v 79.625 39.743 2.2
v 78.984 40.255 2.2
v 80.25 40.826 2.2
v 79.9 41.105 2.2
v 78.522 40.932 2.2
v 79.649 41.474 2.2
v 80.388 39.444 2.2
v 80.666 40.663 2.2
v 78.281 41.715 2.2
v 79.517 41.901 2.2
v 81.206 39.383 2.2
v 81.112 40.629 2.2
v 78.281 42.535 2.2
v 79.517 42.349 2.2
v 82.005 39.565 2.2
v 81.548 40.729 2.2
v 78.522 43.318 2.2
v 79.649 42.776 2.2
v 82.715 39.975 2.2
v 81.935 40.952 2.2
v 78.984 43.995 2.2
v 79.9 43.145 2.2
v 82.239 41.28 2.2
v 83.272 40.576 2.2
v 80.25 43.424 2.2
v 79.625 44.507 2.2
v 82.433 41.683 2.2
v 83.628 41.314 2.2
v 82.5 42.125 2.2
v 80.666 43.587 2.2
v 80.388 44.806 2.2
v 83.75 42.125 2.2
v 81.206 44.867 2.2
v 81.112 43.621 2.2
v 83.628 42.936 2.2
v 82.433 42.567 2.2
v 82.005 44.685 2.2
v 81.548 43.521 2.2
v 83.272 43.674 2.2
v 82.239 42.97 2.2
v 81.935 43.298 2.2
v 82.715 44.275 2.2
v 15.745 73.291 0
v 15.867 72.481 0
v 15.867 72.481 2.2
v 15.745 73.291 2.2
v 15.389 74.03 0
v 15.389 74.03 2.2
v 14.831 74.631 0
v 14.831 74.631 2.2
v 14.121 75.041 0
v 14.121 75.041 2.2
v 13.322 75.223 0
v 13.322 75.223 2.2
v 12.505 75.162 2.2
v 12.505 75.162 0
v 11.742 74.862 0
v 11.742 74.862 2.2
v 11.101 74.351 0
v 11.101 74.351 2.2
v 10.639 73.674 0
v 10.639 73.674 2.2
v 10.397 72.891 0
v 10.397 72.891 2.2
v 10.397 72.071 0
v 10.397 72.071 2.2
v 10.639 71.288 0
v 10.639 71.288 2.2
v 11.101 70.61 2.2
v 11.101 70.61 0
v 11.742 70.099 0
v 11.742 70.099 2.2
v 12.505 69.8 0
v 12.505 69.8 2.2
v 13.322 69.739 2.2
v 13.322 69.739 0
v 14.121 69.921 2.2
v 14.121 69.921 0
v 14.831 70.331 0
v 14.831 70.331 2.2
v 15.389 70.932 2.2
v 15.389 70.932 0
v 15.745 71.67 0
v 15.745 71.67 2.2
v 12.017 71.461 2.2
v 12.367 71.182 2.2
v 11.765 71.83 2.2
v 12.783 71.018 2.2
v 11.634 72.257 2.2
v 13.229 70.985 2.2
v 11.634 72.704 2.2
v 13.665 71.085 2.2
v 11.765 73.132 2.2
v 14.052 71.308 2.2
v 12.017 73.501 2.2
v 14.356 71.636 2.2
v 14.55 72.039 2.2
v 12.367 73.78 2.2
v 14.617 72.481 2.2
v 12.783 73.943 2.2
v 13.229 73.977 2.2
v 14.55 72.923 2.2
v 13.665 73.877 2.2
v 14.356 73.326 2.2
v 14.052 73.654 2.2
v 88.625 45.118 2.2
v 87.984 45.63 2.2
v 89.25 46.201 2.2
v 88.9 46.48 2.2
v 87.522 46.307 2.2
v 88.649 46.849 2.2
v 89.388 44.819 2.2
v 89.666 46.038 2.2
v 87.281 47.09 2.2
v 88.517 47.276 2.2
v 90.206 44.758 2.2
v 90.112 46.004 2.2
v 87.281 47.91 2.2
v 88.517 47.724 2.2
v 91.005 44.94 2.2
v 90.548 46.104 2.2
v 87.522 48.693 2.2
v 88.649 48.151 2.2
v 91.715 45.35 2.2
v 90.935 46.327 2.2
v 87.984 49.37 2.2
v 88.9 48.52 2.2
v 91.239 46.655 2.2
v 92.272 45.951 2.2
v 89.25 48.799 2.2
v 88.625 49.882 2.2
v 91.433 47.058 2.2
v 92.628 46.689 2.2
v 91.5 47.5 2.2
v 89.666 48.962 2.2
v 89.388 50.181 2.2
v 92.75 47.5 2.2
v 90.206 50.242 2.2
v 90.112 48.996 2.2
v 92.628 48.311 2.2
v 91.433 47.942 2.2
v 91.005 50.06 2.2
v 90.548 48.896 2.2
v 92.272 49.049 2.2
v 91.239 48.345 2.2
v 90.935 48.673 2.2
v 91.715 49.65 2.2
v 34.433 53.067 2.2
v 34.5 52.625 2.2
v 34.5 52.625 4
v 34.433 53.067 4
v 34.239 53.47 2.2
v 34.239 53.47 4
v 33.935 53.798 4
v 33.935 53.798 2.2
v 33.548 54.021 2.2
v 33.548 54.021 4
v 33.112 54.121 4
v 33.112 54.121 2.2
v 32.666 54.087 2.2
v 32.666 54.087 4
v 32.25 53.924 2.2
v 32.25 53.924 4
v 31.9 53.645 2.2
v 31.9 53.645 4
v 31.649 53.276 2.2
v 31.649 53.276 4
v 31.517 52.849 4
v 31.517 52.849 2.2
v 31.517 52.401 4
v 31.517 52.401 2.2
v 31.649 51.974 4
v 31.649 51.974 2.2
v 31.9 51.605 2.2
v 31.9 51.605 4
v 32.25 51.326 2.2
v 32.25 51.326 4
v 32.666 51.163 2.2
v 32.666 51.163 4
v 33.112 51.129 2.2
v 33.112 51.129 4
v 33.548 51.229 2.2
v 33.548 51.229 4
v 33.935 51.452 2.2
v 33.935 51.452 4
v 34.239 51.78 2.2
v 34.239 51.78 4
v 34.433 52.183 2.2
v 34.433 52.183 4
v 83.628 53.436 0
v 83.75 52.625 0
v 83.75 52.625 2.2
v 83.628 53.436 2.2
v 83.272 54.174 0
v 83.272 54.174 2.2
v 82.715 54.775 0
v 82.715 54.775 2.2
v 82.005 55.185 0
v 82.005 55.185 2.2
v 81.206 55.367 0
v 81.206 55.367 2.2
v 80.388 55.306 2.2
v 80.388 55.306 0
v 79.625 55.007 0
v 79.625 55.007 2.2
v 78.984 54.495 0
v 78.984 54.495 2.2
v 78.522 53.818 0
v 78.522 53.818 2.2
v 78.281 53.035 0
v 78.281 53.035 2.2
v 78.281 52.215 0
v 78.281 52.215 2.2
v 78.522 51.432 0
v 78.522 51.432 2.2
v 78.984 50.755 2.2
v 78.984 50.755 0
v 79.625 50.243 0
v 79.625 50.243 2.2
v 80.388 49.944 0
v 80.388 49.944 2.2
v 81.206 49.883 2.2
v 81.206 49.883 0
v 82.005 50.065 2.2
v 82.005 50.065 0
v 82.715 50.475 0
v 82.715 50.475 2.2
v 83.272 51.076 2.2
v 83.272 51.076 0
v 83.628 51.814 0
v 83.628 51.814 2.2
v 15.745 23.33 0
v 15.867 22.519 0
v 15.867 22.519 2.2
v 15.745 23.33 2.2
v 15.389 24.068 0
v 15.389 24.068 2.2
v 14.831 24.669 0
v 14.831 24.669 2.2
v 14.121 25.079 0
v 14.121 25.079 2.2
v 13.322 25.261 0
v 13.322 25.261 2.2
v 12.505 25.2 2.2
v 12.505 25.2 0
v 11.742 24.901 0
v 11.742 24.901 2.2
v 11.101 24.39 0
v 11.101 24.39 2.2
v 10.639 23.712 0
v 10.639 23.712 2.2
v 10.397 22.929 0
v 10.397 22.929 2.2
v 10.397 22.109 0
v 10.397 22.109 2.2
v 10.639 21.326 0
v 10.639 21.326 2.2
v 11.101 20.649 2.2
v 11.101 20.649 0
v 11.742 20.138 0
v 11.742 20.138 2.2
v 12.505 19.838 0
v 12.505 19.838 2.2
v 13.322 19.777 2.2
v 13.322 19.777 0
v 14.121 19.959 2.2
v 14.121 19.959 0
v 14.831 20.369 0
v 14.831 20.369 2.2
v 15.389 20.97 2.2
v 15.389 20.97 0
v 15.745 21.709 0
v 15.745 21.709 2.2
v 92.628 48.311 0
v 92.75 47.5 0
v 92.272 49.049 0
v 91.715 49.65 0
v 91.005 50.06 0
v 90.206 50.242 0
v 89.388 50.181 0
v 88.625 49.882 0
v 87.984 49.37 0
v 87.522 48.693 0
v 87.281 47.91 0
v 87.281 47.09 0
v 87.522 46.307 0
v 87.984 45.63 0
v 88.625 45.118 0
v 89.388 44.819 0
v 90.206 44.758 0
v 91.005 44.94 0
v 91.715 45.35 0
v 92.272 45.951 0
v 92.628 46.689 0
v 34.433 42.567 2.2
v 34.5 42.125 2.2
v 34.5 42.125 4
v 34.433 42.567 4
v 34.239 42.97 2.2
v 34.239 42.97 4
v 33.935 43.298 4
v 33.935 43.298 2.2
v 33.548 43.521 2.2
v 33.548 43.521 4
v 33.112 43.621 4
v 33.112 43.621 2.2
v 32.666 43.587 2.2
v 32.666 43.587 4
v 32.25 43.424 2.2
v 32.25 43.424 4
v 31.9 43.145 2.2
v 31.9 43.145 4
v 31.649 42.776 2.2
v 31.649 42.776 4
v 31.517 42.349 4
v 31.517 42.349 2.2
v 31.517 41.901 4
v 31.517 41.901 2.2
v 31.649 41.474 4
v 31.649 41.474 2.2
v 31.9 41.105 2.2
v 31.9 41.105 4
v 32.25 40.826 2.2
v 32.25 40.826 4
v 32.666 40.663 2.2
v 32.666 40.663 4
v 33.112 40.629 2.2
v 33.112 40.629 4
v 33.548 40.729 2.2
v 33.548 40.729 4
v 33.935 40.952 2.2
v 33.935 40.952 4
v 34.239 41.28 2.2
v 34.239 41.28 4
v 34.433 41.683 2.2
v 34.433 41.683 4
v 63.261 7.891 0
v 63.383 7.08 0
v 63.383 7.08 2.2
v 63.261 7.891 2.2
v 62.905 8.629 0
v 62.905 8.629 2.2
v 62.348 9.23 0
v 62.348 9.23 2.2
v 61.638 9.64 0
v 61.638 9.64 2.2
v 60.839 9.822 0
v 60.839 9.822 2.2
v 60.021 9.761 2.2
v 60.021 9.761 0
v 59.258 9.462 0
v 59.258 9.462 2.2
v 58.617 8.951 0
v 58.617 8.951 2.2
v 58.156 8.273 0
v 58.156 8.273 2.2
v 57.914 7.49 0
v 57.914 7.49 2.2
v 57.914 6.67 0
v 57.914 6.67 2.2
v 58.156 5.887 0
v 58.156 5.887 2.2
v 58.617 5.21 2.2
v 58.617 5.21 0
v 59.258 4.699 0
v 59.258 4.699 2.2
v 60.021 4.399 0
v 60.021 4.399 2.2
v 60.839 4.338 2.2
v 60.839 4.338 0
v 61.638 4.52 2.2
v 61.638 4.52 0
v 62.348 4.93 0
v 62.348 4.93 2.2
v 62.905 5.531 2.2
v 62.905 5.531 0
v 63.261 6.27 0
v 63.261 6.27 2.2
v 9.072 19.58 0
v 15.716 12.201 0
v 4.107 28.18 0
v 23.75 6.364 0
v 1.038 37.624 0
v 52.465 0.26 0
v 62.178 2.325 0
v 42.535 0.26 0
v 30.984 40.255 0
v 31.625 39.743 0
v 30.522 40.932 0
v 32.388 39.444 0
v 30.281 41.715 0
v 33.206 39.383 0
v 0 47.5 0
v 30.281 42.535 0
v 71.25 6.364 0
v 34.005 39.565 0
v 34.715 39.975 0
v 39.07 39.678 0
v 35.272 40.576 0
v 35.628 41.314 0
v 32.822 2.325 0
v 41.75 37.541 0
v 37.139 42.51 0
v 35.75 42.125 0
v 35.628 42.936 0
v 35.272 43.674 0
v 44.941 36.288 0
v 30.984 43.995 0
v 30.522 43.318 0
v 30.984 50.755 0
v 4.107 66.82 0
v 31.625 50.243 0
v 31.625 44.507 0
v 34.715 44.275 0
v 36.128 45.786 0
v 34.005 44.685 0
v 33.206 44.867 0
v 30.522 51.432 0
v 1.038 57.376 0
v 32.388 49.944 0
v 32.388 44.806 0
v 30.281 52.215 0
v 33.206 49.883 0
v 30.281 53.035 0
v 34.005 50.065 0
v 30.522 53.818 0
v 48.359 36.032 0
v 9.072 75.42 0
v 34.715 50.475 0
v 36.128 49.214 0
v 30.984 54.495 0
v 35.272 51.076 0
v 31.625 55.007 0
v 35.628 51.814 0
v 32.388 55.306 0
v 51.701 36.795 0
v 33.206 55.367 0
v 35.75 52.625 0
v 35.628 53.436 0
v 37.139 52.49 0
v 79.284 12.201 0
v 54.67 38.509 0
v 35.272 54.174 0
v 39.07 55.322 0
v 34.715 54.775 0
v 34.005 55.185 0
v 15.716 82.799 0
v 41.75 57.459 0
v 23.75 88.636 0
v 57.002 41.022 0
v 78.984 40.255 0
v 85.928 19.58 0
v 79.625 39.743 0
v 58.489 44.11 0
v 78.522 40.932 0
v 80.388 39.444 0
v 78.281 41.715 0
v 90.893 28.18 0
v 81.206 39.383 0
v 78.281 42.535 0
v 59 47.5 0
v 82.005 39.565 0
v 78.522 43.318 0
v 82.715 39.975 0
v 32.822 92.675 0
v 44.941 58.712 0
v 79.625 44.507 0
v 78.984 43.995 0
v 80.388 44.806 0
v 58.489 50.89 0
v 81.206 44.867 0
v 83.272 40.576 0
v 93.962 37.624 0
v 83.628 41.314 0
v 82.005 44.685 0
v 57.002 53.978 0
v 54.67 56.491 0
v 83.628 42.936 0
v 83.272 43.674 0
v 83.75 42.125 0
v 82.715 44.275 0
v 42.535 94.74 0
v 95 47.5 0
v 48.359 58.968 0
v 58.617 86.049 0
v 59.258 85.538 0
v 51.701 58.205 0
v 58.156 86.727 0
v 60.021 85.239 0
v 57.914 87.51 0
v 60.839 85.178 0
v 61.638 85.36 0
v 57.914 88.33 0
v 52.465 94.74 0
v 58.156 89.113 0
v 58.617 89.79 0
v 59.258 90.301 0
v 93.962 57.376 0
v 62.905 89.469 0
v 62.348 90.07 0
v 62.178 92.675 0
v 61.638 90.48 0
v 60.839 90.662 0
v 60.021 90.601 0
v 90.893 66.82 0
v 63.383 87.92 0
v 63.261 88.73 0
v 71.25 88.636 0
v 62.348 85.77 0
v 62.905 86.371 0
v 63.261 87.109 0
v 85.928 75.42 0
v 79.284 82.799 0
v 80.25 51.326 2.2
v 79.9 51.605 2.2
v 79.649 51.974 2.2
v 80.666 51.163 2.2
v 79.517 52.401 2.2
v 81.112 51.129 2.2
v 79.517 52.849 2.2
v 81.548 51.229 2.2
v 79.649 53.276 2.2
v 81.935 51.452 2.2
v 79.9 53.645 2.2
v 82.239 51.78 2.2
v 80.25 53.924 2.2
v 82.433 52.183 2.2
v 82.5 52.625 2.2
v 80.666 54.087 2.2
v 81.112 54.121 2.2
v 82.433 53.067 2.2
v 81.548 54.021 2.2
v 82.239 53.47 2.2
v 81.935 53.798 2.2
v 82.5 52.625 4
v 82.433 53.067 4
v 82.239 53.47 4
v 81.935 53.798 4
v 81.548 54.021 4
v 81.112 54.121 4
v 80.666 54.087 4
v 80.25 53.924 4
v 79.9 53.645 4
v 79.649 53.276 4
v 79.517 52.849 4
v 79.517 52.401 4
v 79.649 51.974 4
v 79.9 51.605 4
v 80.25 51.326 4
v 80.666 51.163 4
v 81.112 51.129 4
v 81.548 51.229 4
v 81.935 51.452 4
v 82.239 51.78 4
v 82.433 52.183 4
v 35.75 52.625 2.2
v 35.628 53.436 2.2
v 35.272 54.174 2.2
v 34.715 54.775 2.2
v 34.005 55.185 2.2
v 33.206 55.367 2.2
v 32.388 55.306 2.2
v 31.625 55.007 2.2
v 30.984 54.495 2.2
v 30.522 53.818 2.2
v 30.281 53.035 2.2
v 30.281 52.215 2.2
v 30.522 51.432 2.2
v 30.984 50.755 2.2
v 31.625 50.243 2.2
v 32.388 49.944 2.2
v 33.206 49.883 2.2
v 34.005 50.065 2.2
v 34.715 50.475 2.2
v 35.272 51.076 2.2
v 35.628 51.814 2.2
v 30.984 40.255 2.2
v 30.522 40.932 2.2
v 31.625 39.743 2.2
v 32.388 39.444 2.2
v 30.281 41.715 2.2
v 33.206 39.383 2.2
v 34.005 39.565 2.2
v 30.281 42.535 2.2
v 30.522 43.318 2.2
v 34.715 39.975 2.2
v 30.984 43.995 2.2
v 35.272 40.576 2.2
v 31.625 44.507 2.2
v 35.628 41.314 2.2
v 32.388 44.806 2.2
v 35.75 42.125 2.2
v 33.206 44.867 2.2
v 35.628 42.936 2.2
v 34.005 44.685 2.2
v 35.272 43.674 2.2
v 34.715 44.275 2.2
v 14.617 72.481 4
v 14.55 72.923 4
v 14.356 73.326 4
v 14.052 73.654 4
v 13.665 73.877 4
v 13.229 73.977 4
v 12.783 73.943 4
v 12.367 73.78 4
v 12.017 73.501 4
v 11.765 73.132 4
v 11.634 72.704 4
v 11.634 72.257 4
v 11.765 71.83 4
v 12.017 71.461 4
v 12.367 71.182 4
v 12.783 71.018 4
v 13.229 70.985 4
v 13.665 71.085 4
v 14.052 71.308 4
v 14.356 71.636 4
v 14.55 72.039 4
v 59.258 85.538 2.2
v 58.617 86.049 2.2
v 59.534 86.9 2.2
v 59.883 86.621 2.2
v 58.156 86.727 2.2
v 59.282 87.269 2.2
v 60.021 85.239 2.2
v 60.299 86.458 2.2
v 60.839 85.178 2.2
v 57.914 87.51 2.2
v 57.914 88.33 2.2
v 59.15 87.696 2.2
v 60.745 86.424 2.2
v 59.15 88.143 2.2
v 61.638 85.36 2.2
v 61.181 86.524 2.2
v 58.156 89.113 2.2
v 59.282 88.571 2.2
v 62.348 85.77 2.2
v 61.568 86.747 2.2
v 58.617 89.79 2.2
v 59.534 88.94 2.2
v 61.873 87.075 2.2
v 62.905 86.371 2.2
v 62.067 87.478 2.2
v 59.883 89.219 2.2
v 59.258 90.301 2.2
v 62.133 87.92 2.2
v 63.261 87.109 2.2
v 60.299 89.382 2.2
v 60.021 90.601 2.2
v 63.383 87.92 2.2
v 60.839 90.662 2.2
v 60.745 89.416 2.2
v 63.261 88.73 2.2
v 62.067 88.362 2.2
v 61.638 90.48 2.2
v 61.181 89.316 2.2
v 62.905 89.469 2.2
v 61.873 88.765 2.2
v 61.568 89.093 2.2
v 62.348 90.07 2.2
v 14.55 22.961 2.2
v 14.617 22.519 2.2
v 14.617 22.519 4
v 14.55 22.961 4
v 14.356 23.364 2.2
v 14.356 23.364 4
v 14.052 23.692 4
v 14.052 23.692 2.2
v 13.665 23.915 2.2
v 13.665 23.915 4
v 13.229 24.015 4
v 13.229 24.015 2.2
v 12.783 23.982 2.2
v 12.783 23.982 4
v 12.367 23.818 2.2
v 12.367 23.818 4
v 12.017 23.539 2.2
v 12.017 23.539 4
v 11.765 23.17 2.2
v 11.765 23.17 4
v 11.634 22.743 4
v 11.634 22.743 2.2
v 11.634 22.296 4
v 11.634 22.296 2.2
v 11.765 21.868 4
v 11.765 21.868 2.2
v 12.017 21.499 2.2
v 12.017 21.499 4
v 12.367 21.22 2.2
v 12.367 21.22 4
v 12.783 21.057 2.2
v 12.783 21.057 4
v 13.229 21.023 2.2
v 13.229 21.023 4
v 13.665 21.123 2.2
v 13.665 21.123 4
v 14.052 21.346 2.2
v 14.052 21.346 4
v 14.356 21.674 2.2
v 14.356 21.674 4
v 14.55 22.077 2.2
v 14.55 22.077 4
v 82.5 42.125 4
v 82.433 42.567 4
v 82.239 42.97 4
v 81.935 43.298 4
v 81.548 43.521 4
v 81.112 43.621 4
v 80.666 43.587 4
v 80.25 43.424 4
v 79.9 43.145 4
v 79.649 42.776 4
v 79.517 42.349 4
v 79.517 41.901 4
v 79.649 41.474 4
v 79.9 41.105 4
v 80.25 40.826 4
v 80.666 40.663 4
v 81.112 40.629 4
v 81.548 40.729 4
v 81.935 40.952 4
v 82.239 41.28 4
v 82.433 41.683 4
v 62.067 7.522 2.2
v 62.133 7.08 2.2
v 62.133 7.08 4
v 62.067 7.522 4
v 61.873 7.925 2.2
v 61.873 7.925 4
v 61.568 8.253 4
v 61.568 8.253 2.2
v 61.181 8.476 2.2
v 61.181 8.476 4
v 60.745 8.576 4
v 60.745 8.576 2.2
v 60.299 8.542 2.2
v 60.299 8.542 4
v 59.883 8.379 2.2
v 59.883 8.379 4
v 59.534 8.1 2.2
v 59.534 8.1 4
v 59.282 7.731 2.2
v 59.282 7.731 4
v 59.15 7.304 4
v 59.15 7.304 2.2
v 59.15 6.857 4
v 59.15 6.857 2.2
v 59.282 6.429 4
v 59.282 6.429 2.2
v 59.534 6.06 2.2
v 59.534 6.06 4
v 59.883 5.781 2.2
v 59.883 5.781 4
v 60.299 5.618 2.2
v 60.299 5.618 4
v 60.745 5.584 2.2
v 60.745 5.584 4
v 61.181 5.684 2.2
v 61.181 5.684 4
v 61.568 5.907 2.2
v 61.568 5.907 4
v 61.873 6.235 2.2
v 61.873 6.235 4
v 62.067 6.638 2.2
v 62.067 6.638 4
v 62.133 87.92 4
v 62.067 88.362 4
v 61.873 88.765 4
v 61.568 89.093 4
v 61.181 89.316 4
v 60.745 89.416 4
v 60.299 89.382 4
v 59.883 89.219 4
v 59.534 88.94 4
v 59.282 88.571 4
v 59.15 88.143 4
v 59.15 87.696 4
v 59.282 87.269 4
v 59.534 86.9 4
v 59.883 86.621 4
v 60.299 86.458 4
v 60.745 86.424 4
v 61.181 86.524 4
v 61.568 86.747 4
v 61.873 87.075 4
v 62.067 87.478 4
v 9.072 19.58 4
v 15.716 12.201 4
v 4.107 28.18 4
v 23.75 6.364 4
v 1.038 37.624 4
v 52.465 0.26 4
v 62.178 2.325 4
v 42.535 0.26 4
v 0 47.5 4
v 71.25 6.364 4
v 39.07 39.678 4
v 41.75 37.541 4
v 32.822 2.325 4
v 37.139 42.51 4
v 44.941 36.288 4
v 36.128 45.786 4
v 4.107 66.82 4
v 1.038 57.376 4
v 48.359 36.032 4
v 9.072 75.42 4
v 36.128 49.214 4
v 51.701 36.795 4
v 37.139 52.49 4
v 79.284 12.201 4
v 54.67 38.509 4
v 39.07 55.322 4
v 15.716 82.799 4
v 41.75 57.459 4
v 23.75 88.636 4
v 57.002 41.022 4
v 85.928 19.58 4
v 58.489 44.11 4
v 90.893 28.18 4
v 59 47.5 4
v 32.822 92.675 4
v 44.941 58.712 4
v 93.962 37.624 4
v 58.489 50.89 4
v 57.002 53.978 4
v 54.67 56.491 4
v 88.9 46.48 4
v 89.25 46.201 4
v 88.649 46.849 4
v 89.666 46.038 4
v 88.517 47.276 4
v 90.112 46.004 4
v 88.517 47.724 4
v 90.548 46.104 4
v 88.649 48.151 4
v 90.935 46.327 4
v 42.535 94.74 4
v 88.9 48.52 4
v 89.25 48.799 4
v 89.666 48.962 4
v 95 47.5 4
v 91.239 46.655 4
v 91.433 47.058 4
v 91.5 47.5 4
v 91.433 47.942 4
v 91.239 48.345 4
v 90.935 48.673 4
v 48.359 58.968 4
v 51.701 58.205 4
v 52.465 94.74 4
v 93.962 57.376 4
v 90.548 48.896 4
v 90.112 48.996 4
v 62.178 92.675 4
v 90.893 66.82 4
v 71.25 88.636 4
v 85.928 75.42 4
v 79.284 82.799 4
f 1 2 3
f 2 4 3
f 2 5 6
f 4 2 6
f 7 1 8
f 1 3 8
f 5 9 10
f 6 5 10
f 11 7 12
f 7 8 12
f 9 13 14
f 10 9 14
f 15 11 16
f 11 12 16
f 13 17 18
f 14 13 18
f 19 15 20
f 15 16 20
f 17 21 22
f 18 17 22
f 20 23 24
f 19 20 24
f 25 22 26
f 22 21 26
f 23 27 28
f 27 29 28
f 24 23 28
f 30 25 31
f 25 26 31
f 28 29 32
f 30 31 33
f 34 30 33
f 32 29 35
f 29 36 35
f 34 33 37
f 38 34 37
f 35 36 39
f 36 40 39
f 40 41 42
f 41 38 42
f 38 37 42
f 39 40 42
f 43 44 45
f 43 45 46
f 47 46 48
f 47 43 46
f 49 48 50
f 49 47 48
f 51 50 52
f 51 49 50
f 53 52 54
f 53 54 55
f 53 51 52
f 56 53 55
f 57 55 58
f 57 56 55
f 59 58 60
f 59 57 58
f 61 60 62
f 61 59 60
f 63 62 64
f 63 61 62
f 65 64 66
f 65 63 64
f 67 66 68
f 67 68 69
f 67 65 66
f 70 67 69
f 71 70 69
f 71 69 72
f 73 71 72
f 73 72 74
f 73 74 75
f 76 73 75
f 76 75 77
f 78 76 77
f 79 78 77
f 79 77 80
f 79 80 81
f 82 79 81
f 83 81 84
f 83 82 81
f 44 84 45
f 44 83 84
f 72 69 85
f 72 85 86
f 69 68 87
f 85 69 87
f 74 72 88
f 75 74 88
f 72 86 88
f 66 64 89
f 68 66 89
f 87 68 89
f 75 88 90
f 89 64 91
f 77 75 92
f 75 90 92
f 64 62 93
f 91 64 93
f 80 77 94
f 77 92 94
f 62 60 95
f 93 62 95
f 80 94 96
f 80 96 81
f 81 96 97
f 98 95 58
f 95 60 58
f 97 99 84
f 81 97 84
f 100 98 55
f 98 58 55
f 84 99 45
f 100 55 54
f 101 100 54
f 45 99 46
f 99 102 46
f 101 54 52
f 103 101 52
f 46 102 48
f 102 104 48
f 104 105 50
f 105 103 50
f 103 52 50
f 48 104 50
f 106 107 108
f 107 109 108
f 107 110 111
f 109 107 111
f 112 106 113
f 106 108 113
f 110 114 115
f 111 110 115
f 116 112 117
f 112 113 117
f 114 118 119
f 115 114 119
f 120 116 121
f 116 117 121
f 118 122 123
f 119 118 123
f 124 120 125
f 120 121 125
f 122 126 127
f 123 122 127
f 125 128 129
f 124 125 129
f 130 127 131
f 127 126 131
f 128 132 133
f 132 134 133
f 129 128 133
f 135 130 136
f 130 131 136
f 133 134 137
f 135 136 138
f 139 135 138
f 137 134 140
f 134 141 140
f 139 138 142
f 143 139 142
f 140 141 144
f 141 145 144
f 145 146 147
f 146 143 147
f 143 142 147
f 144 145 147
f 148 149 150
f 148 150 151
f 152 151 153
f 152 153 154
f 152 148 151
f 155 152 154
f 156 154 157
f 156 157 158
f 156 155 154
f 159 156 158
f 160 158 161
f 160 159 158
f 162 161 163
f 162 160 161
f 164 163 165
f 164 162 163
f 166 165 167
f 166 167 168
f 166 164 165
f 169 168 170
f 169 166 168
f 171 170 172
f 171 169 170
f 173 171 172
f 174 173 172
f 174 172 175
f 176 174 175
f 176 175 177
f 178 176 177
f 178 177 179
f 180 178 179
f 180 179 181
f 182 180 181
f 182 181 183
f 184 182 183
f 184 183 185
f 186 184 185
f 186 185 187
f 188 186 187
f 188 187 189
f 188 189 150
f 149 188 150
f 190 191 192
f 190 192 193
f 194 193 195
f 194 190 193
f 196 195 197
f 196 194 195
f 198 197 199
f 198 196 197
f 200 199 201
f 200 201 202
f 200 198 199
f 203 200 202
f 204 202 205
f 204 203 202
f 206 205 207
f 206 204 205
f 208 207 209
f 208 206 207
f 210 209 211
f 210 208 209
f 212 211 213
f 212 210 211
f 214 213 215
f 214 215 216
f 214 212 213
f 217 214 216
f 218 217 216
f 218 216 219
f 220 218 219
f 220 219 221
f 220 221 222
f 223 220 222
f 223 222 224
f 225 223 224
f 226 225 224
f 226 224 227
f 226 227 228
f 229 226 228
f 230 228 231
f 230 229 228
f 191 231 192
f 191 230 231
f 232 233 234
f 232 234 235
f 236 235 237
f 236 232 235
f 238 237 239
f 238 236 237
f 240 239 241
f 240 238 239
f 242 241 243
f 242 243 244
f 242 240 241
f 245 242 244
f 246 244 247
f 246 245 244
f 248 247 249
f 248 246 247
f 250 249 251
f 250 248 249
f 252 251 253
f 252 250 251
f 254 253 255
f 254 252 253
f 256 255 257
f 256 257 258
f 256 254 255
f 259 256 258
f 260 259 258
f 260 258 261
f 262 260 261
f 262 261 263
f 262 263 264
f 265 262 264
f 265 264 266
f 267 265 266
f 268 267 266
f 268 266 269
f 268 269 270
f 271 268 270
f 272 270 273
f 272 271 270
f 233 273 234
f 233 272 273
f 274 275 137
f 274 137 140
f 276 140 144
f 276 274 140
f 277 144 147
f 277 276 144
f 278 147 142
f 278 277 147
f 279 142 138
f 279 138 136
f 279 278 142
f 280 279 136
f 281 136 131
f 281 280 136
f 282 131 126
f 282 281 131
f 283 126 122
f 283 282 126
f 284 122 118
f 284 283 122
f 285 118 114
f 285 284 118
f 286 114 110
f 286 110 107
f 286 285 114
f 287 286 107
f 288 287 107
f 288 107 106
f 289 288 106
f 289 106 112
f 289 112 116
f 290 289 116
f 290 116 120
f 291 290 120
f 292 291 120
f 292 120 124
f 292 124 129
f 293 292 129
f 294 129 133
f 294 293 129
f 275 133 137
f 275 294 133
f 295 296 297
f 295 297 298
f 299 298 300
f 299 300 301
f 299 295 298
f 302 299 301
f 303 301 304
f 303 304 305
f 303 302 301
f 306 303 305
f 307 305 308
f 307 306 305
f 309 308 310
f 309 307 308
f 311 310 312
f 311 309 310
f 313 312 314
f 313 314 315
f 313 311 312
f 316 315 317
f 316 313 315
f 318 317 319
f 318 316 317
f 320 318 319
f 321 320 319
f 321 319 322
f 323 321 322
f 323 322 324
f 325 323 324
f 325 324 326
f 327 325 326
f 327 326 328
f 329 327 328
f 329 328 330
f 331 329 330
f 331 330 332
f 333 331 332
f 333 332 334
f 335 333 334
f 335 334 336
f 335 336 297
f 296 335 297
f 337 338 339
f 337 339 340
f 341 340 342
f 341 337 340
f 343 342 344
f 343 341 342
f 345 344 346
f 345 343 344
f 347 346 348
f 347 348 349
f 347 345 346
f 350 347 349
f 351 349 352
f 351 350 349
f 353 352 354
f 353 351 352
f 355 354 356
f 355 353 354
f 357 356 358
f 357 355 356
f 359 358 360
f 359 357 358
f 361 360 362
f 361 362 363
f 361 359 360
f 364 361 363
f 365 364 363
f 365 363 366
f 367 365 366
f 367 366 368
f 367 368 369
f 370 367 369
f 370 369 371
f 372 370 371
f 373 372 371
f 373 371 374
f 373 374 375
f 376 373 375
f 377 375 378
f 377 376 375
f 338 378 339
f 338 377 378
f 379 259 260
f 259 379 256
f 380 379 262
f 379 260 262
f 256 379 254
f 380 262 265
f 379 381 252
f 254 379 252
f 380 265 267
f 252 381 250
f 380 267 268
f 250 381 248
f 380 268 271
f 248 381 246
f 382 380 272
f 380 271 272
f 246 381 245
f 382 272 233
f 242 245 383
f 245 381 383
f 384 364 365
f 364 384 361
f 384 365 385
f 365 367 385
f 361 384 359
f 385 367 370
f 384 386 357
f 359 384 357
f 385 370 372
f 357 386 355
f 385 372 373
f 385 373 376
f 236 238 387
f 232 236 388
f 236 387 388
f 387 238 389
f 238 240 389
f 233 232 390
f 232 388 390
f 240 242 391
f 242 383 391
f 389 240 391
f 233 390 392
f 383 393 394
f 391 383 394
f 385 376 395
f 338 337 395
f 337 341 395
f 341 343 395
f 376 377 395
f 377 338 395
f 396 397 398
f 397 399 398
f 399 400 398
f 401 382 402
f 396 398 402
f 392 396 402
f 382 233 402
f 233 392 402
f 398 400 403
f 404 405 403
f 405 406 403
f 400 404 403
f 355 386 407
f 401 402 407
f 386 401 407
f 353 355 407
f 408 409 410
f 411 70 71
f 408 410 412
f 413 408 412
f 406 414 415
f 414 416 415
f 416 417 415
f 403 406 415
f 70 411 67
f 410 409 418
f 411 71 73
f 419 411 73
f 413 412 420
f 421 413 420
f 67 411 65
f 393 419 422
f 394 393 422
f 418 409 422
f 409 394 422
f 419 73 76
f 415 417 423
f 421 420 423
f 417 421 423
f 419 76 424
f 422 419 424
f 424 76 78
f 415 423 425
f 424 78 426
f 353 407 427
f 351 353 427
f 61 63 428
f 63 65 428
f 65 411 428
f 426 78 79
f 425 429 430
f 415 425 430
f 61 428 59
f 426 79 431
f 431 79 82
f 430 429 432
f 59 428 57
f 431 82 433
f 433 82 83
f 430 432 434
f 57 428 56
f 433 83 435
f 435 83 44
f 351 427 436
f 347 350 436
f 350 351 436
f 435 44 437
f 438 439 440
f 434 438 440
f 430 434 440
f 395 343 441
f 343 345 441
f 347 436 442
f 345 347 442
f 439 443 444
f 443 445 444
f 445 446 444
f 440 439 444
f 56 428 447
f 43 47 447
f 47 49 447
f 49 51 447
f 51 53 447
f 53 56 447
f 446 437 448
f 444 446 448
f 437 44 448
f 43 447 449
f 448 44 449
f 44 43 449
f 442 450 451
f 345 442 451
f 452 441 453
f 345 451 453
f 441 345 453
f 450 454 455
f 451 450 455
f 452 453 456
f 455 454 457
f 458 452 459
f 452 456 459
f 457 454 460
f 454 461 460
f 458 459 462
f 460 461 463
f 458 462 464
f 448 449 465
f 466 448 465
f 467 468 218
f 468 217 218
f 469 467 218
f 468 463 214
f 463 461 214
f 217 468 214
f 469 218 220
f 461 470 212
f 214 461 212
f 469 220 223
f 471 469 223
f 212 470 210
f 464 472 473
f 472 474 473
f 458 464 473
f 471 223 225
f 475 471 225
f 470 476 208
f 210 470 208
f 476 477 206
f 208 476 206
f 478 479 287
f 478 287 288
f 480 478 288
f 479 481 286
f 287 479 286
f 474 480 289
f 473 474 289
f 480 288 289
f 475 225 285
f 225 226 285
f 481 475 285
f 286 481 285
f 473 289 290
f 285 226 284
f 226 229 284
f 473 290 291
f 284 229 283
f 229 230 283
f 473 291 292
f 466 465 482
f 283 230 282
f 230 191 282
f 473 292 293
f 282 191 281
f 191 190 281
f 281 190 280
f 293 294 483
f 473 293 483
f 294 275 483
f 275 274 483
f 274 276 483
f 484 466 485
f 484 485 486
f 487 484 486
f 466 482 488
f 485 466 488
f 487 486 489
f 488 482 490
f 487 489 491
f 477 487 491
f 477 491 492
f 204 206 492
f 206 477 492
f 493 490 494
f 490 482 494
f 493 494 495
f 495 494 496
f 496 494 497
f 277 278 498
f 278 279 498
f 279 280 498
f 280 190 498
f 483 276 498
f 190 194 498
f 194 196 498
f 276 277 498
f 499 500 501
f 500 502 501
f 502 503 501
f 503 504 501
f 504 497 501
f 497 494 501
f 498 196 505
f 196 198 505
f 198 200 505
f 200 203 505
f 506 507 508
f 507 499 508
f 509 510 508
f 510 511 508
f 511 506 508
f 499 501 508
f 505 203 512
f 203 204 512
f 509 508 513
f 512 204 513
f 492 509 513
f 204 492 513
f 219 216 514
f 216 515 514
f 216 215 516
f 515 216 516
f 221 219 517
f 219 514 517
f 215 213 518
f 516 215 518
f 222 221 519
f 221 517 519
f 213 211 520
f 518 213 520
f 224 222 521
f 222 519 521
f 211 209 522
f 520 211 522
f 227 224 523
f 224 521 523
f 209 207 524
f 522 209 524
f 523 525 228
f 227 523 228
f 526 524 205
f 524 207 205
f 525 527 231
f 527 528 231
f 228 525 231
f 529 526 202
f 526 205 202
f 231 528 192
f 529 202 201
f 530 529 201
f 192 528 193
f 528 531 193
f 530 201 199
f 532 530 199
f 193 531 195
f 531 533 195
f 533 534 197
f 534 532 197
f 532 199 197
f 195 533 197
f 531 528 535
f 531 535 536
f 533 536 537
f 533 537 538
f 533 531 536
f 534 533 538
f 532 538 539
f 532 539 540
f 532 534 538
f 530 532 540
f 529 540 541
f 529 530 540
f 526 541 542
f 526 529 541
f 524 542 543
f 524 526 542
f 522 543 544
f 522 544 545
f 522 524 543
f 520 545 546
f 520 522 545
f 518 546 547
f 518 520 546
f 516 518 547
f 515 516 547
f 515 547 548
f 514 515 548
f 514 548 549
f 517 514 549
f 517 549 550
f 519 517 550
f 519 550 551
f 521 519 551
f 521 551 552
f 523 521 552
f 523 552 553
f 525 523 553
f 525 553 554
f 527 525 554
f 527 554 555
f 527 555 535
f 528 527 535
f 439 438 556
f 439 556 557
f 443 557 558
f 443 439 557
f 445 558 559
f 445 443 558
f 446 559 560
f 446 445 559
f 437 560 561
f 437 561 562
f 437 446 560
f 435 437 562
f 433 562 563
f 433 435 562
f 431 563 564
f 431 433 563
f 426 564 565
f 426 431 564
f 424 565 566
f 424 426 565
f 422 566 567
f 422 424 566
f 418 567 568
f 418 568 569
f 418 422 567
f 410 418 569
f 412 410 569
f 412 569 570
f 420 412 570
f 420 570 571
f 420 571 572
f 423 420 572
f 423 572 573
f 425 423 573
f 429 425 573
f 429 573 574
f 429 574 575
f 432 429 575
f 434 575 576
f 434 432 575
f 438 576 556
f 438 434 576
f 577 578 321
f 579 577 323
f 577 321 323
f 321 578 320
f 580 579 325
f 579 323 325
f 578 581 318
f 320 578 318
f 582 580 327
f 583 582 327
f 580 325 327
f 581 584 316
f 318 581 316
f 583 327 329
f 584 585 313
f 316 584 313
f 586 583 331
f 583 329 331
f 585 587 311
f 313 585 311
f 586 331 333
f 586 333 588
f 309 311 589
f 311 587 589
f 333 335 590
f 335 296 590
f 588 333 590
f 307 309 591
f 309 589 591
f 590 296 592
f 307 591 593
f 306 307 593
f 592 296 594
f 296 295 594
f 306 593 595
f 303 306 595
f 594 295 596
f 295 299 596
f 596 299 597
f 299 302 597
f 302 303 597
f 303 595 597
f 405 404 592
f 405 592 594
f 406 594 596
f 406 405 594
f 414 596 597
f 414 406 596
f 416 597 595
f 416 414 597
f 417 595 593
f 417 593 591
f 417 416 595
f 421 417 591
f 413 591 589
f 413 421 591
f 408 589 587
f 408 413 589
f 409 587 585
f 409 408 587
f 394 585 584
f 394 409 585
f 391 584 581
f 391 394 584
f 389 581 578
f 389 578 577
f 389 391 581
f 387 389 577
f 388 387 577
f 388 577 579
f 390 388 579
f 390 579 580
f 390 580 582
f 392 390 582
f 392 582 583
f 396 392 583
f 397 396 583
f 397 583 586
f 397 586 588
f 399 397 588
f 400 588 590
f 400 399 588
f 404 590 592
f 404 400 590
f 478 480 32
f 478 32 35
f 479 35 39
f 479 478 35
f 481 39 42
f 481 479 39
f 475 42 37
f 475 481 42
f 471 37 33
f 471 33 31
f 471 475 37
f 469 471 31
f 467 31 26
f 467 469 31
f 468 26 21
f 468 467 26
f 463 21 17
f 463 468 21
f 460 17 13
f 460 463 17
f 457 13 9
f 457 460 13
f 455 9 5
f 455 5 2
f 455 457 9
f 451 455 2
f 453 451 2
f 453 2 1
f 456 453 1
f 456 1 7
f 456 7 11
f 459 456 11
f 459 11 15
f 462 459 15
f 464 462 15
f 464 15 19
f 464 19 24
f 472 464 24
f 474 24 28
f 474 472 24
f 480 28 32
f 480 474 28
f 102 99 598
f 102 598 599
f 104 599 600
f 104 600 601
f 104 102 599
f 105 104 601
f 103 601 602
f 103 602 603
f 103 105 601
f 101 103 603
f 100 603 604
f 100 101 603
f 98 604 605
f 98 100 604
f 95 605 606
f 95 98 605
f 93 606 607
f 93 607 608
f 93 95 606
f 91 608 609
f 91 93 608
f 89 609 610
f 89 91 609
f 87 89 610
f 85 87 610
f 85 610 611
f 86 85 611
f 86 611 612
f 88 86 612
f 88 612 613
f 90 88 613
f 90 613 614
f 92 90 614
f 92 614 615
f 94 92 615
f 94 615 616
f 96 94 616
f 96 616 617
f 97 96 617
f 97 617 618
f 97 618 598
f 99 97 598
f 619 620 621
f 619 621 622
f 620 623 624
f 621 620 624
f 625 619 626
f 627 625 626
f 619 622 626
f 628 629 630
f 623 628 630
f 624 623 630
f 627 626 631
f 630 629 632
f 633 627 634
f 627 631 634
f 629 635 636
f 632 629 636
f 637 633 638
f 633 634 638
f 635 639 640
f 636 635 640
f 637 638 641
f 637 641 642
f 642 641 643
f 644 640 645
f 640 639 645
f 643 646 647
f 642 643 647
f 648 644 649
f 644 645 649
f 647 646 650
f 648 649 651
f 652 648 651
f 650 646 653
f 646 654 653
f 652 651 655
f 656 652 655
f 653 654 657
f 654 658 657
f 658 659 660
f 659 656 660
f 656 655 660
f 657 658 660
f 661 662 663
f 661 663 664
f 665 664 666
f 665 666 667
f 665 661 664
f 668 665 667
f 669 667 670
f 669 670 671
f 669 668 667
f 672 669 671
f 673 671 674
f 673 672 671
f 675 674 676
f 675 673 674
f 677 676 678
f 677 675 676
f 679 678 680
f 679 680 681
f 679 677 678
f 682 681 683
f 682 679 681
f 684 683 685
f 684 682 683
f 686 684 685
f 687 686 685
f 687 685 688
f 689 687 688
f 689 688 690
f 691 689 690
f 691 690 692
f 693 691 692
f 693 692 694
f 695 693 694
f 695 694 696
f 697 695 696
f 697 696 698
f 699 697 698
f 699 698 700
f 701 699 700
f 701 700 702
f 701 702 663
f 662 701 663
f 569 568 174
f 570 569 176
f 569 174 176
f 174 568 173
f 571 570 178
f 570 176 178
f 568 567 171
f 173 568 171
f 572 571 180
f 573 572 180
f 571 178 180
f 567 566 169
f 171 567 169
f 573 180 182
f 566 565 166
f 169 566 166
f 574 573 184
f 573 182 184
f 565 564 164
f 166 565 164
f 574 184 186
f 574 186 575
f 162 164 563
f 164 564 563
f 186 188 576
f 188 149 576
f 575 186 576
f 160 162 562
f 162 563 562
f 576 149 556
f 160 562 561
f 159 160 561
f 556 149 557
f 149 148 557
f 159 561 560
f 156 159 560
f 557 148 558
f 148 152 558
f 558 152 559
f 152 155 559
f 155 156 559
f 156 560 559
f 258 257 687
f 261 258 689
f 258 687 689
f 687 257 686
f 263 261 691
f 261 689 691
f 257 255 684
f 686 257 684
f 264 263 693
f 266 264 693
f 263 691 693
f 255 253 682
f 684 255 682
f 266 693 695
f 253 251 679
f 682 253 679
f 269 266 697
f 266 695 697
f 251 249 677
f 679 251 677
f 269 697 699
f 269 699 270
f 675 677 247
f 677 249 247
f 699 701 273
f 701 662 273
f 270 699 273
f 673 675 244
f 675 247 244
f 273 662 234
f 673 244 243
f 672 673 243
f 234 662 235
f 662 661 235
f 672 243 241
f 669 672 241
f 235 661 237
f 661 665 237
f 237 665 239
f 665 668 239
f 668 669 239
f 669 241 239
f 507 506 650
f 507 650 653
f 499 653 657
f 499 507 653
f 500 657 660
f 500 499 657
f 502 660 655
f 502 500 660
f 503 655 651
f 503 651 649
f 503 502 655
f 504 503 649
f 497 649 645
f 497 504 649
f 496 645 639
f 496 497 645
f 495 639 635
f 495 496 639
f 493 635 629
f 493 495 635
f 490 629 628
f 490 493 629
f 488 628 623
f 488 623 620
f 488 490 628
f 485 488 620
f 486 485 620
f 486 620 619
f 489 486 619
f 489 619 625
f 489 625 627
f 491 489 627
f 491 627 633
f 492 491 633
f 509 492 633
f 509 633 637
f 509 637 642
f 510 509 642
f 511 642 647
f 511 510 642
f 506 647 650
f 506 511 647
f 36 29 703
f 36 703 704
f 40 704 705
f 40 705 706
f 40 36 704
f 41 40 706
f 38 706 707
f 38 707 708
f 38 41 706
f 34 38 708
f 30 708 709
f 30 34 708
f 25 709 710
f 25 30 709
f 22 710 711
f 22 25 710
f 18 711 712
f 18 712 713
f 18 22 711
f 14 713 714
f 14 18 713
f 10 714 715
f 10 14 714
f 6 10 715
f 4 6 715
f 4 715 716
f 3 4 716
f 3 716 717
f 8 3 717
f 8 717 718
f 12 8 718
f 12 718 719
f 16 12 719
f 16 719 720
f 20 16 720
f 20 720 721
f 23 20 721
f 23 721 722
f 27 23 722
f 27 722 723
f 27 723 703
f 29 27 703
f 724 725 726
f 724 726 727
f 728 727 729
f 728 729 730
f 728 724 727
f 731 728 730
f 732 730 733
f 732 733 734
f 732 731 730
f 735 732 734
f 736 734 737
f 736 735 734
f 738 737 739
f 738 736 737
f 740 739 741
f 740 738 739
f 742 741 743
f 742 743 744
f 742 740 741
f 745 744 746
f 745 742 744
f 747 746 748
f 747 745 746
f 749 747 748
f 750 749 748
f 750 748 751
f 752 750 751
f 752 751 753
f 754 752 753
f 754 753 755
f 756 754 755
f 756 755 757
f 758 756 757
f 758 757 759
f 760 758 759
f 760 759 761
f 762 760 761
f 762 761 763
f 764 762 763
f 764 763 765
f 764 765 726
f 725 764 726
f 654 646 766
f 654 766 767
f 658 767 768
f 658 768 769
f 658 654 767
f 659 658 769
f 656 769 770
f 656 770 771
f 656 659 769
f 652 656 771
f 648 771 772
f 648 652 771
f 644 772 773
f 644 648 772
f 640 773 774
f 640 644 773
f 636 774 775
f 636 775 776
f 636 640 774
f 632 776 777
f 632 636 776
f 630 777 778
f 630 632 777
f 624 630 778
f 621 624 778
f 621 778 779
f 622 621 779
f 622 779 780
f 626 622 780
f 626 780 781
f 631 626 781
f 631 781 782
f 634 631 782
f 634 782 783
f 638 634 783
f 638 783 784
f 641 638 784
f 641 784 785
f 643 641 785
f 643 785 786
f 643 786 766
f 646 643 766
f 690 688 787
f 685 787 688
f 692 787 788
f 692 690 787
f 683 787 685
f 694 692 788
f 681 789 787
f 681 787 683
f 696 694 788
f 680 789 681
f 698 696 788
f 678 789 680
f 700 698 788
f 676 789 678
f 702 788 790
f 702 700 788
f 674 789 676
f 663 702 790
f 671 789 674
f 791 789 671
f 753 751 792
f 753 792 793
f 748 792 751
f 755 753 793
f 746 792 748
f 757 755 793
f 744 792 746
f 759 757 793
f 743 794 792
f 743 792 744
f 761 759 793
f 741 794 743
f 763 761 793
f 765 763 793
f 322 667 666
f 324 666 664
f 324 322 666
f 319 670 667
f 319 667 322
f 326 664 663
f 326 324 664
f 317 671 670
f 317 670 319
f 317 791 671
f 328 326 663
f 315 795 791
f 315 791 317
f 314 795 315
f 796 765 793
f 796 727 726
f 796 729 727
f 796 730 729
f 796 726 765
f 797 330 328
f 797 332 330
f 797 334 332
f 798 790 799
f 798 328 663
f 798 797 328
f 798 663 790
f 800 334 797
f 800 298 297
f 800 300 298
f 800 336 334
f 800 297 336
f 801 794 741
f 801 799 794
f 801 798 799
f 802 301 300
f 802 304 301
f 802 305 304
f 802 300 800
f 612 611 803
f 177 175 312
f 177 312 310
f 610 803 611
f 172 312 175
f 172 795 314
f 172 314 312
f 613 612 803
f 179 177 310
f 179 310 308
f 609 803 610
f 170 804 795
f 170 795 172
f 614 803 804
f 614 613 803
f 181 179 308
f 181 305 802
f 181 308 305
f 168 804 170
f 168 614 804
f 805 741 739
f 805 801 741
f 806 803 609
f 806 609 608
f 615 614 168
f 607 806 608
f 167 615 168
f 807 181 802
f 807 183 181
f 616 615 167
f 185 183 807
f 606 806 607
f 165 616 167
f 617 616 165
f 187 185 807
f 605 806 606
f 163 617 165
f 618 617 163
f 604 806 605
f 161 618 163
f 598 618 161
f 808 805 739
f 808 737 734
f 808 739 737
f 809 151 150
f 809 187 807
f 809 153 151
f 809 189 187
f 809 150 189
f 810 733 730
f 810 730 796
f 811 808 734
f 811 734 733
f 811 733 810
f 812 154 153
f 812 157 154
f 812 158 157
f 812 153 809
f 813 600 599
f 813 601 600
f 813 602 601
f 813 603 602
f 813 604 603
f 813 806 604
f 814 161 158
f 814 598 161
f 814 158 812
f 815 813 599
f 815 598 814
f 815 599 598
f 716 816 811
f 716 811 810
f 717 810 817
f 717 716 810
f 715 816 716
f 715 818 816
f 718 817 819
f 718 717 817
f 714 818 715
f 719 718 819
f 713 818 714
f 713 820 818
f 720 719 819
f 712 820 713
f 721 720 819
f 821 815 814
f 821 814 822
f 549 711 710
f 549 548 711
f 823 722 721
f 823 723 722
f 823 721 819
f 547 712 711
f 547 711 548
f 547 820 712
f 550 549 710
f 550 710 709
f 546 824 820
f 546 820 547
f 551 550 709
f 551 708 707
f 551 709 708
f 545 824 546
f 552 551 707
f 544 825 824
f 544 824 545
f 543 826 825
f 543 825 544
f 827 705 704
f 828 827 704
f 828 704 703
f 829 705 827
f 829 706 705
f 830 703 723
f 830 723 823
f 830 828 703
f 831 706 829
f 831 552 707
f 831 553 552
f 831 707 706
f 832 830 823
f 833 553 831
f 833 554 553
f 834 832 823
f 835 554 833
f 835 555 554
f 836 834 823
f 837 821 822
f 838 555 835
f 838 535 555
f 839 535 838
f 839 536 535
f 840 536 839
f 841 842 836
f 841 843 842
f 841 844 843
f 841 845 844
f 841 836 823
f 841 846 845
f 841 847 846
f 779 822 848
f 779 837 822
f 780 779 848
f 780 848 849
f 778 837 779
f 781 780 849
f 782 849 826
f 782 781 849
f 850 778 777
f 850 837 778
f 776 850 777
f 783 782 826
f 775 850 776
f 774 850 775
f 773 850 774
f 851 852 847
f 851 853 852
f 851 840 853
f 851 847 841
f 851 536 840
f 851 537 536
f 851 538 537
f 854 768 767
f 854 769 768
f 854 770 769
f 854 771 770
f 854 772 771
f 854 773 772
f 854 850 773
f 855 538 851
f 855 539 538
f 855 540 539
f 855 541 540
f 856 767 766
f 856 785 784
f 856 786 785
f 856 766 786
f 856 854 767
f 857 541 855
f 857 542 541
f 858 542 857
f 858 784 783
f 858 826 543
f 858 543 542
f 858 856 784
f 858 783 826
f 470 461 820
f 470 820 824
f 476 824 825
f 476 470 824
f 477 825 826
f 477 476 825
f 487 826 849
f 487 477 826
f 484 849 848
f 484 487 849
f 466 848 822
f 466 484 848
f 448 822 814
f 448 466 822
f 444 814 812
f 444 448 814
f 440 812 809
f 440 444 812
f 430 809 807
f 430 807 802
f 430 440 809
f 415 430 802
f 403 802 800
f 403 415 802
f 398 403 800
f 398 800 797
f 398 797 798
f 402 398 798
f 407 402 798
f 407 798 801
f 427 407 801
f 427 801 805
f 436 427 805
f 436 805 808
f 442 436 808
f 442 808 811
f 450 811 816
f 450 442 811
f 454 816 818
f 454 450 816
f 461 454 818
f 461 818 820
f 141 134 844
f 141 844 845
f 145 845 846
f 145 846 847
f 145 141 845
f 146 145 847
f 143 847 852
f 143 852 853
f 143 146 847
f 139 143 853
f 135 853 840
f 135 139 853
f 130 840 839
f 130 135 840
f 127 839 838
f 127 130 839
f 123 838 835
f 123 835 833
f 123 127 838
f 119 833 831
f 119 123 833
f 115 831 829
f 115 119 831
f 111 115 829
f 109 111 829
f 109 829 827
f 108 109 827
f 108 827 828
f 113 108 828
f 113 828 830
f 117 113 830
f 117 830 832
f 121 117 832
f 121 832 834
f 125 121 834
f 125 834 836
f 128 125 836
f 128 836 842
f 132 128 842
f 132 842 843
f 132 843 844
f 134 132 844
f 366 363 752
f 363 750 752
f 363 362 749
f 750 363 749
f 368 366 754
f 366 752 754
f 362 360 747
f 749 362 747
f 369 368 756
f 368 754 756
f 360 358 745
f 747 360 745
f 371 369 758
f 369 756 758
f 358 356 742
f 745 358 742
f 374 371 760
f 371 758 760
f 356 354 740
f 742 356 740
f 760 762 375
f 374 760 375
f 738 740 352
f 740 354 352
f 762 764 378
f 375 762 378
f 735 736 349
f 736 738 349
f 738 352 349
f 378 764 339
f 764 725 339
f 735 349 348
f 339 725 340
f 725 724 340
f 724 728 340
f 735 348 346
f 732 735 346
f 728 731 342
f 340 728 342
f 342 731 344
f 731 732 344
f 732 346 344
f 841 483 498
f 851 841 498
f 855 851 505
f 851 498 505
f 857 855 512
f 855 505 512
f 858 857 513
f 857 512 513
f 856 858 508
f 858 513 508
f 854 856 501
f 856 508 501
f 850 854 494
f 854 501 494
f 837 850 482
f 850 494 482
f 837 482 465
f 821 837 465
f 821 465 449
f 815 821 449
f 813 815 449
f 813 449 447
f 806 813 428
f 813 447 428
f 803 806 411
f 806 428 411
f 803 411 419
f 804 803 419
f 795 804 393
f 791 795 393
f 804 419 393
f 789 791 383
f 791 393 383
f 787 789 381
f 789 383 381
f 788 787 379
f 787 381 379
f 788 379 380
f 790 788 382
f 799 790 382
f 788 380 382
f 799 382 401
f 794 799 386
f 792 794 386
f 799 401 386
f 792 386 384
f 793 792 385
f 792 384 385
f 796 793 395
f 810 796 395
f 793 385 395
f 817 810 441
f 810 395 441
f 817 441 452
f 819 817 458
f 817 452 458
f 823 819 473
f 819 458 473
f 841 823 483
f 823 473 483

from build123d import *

# Parameters (mm, degrees)
SKETCH1_R           = 47.5
SKETCH1_R_2         = 2.75
SKETCH1_R_3         = 11.5
SKETCH1_R_4         = 1.5
BOSS_EXTRUDE2_DEPTH = 4
SKETCH1_5_R         = 2.75
SKETCH1_5_R_2       = 1.5
CUT_EXTRUDE1_DEPTH  = 2.2


with BuildPart() as part:
    # Sketch1 → Boss-Extrude2 (new body)
    with BuildSketch(Plane.XY):
        with Locations((47.5, 47.5)):
            Circle(SKETCH1_R)
        with Locations((81, 42.125)):
            Circle(SKETCH1_R_2, mode=Mode.SUBTRACT)
        with Locations((90, 47.5)):
            Circle(SKETCH1_R_2, mode=Mode.SUBTRACT)
        with Locations((81, 52.625)):
            Circle(SKETCH1_R_2, mode=Mode.SUBTRACT)
        with Locations((60.633222261, 87.919901943)):
            Circle(SKETCH1_R_2, mode=Mode.SUBTRACT)
        with Locations((13.116777739, 72.480873222)):
            Circle(SKETCH1_R_2, mode=Mode.SUBTRACT)
        with Locations((33, 52.625)):
            Circle(SKETCH1_R_2, mode=Mode.SUBTRACT)
        with Locations((33, 42.125)):
            Circle(SKETCH1_R_2, mode=Mode.SUBTRACT)
        with Locations((60.633222261, 7.080098057)):
            Circle(SKETCH1_R_2, mode=Mode.SUBTRACT)
        with Locations((13.116777739, 22.519126778)):
            Circle(SKETCH1_R_2, mode=Mode.SUBTRACT)
        with Locations((47.5, 47.5)):
            Circle(SKETCH1_R_3, mode=Mode.SUBTRACT)
        with Locations((13.116777739, 72.480873222)):
            Circle(SKETCH1_R_2)
        with Locations((13.116777739, 72.480873222)):
            Circle(SKETCH1_R_4, mode=Mode.SUBTRACT)
        with Locations((60.633222261, 87.919901943)):
            Circle(SKETCH1_R_2)
        with Locations((60.633222261, 87.919901943)):
            Circle(SKETCH1_R_4, mode=Mode.SUBTRACT)
        with Locations((33, 52.625)):
            Circle(SKETCH1_R_2)
        with Locations((33, 52.625)):
            Circle(SKETCH1_R_4, mode=Mode.SUBTRACT)
        with Locations((81, 52.625)):
            Circle(SKETCH1_R_2)
        with Locations((81, 52.625)):
            Circle(SKETCH1_R_4, mode=Mode.SUBTRACT)
        with Locations((90, 47.5)):
            Circle(SKETCH1_R_2)
        with Locations((90, 47.5)):
            Circle(SKETCH1_R_4, mode=Mode.SUBTRACT)
        with Locations((81, 42.125)):
            Circle(SKETCH1_R_2)
        with Locations((81, 42.125)):
            Circle(SKETCH1_R_4, mode=Mode.SUBTRACT)
        with Locations((33, 42.125)):
            Circle(SKETCH1_R_2)
        with Locations((33, 42.125)):
            Circle(SKETCH1_R_4, mode=Mode.SUBTRACT)
        with Locations((13.116777739, 22.519126778)):
            Circle(SKETCH1_R_2)
        with Locations((13.116777739, 22.519126778)):
            Circle(SKETCH1_R_4, mode=Mode.SUBTRACT)
        with Locations((60.633222261, 7.080098057)):
            Circle(SKETCH1_R_2)
        with Locations((60.633222261, 7.080098057)):
            Circle(SKETCH1_R_4, mode=Mode.SUBTRACT)
    extrude(amount=BOSS_EXTRUDE2_DEPTH)

    # Sketch1_5 → Cut-Extrude1 (cut)
    with BuildSketch(Plane.XY):
        with Locations((33, 52.625)):
            Circle(SKETCH1_5_R)
        with Locations((33, 52.625)):
            Circle(SKETCH1_5_R_2, mode=Mode.SUBTRACT)
        with Locations((33, 42.125)):
            Circle(SKETCH1_5_R)
        with Locations((33, 42.125)):
            Circle(SKETCH1_5_R_2, mode=Mode.SUBTRACT)
        with Locations((13.116777739, 22.519126778)):
            Circle(SKETCH1_5_R)
        with Locations((13.116777739, 22.519126778)):
            Circle(SKETCH1_5_R_2, mode=Mode.SUBTRACT)
        with Locations((13.116777739, 72.480873222)):
            Circle(SKETCH1_5_R)
        with Locations((13.116777739, 72.480873222)):
            Circle(SKETCH1_5_R_2, mode=Mode.SUBTRACT)
        with Locations((60.633222261, 87.919901943)):
            Circle(SKETCH1_5_R)
        with Locations((60.633222261, 87.919901943)):
            Circle(SKETCH1_5_R_2, mode=Mode.SUBTRACT)
        with Locations((81, 52.625)):
            Circle(SKETCH1_5_R)
        with Locations((81, 52.625)):
            Circle(SKETCH1_5_R_2, mode=Mode.SUBTRACT)
        with Locations((90, 47.5)):
            Circle(SKETCH1_5_R)
        with Locations((90, 47.5)):
            Circle(SKETCH1_5_R_2, mode=Mode.SUBTRACT)
        with Locations((81, 42.125)):
            Circle(SKETCH1_5_R)
        with Locations((81, 42.125)):
            Circle(SKETCH1_5_R_2, mode=Mode.SUBTRACT)
        with Locations((60.633222261, 7.080098057)):
            Circle(SKETCH1_5_R)
        with Locations((60.633222261, 7.080098057)):
            Circle(SKETCH1_5_R_2, mode=Mode.SUBTRACT)
    extrude(amount=CUT_EXTRUDE1_DEPTH, mode=Mode.SUBTRACT)


solid = part.part
